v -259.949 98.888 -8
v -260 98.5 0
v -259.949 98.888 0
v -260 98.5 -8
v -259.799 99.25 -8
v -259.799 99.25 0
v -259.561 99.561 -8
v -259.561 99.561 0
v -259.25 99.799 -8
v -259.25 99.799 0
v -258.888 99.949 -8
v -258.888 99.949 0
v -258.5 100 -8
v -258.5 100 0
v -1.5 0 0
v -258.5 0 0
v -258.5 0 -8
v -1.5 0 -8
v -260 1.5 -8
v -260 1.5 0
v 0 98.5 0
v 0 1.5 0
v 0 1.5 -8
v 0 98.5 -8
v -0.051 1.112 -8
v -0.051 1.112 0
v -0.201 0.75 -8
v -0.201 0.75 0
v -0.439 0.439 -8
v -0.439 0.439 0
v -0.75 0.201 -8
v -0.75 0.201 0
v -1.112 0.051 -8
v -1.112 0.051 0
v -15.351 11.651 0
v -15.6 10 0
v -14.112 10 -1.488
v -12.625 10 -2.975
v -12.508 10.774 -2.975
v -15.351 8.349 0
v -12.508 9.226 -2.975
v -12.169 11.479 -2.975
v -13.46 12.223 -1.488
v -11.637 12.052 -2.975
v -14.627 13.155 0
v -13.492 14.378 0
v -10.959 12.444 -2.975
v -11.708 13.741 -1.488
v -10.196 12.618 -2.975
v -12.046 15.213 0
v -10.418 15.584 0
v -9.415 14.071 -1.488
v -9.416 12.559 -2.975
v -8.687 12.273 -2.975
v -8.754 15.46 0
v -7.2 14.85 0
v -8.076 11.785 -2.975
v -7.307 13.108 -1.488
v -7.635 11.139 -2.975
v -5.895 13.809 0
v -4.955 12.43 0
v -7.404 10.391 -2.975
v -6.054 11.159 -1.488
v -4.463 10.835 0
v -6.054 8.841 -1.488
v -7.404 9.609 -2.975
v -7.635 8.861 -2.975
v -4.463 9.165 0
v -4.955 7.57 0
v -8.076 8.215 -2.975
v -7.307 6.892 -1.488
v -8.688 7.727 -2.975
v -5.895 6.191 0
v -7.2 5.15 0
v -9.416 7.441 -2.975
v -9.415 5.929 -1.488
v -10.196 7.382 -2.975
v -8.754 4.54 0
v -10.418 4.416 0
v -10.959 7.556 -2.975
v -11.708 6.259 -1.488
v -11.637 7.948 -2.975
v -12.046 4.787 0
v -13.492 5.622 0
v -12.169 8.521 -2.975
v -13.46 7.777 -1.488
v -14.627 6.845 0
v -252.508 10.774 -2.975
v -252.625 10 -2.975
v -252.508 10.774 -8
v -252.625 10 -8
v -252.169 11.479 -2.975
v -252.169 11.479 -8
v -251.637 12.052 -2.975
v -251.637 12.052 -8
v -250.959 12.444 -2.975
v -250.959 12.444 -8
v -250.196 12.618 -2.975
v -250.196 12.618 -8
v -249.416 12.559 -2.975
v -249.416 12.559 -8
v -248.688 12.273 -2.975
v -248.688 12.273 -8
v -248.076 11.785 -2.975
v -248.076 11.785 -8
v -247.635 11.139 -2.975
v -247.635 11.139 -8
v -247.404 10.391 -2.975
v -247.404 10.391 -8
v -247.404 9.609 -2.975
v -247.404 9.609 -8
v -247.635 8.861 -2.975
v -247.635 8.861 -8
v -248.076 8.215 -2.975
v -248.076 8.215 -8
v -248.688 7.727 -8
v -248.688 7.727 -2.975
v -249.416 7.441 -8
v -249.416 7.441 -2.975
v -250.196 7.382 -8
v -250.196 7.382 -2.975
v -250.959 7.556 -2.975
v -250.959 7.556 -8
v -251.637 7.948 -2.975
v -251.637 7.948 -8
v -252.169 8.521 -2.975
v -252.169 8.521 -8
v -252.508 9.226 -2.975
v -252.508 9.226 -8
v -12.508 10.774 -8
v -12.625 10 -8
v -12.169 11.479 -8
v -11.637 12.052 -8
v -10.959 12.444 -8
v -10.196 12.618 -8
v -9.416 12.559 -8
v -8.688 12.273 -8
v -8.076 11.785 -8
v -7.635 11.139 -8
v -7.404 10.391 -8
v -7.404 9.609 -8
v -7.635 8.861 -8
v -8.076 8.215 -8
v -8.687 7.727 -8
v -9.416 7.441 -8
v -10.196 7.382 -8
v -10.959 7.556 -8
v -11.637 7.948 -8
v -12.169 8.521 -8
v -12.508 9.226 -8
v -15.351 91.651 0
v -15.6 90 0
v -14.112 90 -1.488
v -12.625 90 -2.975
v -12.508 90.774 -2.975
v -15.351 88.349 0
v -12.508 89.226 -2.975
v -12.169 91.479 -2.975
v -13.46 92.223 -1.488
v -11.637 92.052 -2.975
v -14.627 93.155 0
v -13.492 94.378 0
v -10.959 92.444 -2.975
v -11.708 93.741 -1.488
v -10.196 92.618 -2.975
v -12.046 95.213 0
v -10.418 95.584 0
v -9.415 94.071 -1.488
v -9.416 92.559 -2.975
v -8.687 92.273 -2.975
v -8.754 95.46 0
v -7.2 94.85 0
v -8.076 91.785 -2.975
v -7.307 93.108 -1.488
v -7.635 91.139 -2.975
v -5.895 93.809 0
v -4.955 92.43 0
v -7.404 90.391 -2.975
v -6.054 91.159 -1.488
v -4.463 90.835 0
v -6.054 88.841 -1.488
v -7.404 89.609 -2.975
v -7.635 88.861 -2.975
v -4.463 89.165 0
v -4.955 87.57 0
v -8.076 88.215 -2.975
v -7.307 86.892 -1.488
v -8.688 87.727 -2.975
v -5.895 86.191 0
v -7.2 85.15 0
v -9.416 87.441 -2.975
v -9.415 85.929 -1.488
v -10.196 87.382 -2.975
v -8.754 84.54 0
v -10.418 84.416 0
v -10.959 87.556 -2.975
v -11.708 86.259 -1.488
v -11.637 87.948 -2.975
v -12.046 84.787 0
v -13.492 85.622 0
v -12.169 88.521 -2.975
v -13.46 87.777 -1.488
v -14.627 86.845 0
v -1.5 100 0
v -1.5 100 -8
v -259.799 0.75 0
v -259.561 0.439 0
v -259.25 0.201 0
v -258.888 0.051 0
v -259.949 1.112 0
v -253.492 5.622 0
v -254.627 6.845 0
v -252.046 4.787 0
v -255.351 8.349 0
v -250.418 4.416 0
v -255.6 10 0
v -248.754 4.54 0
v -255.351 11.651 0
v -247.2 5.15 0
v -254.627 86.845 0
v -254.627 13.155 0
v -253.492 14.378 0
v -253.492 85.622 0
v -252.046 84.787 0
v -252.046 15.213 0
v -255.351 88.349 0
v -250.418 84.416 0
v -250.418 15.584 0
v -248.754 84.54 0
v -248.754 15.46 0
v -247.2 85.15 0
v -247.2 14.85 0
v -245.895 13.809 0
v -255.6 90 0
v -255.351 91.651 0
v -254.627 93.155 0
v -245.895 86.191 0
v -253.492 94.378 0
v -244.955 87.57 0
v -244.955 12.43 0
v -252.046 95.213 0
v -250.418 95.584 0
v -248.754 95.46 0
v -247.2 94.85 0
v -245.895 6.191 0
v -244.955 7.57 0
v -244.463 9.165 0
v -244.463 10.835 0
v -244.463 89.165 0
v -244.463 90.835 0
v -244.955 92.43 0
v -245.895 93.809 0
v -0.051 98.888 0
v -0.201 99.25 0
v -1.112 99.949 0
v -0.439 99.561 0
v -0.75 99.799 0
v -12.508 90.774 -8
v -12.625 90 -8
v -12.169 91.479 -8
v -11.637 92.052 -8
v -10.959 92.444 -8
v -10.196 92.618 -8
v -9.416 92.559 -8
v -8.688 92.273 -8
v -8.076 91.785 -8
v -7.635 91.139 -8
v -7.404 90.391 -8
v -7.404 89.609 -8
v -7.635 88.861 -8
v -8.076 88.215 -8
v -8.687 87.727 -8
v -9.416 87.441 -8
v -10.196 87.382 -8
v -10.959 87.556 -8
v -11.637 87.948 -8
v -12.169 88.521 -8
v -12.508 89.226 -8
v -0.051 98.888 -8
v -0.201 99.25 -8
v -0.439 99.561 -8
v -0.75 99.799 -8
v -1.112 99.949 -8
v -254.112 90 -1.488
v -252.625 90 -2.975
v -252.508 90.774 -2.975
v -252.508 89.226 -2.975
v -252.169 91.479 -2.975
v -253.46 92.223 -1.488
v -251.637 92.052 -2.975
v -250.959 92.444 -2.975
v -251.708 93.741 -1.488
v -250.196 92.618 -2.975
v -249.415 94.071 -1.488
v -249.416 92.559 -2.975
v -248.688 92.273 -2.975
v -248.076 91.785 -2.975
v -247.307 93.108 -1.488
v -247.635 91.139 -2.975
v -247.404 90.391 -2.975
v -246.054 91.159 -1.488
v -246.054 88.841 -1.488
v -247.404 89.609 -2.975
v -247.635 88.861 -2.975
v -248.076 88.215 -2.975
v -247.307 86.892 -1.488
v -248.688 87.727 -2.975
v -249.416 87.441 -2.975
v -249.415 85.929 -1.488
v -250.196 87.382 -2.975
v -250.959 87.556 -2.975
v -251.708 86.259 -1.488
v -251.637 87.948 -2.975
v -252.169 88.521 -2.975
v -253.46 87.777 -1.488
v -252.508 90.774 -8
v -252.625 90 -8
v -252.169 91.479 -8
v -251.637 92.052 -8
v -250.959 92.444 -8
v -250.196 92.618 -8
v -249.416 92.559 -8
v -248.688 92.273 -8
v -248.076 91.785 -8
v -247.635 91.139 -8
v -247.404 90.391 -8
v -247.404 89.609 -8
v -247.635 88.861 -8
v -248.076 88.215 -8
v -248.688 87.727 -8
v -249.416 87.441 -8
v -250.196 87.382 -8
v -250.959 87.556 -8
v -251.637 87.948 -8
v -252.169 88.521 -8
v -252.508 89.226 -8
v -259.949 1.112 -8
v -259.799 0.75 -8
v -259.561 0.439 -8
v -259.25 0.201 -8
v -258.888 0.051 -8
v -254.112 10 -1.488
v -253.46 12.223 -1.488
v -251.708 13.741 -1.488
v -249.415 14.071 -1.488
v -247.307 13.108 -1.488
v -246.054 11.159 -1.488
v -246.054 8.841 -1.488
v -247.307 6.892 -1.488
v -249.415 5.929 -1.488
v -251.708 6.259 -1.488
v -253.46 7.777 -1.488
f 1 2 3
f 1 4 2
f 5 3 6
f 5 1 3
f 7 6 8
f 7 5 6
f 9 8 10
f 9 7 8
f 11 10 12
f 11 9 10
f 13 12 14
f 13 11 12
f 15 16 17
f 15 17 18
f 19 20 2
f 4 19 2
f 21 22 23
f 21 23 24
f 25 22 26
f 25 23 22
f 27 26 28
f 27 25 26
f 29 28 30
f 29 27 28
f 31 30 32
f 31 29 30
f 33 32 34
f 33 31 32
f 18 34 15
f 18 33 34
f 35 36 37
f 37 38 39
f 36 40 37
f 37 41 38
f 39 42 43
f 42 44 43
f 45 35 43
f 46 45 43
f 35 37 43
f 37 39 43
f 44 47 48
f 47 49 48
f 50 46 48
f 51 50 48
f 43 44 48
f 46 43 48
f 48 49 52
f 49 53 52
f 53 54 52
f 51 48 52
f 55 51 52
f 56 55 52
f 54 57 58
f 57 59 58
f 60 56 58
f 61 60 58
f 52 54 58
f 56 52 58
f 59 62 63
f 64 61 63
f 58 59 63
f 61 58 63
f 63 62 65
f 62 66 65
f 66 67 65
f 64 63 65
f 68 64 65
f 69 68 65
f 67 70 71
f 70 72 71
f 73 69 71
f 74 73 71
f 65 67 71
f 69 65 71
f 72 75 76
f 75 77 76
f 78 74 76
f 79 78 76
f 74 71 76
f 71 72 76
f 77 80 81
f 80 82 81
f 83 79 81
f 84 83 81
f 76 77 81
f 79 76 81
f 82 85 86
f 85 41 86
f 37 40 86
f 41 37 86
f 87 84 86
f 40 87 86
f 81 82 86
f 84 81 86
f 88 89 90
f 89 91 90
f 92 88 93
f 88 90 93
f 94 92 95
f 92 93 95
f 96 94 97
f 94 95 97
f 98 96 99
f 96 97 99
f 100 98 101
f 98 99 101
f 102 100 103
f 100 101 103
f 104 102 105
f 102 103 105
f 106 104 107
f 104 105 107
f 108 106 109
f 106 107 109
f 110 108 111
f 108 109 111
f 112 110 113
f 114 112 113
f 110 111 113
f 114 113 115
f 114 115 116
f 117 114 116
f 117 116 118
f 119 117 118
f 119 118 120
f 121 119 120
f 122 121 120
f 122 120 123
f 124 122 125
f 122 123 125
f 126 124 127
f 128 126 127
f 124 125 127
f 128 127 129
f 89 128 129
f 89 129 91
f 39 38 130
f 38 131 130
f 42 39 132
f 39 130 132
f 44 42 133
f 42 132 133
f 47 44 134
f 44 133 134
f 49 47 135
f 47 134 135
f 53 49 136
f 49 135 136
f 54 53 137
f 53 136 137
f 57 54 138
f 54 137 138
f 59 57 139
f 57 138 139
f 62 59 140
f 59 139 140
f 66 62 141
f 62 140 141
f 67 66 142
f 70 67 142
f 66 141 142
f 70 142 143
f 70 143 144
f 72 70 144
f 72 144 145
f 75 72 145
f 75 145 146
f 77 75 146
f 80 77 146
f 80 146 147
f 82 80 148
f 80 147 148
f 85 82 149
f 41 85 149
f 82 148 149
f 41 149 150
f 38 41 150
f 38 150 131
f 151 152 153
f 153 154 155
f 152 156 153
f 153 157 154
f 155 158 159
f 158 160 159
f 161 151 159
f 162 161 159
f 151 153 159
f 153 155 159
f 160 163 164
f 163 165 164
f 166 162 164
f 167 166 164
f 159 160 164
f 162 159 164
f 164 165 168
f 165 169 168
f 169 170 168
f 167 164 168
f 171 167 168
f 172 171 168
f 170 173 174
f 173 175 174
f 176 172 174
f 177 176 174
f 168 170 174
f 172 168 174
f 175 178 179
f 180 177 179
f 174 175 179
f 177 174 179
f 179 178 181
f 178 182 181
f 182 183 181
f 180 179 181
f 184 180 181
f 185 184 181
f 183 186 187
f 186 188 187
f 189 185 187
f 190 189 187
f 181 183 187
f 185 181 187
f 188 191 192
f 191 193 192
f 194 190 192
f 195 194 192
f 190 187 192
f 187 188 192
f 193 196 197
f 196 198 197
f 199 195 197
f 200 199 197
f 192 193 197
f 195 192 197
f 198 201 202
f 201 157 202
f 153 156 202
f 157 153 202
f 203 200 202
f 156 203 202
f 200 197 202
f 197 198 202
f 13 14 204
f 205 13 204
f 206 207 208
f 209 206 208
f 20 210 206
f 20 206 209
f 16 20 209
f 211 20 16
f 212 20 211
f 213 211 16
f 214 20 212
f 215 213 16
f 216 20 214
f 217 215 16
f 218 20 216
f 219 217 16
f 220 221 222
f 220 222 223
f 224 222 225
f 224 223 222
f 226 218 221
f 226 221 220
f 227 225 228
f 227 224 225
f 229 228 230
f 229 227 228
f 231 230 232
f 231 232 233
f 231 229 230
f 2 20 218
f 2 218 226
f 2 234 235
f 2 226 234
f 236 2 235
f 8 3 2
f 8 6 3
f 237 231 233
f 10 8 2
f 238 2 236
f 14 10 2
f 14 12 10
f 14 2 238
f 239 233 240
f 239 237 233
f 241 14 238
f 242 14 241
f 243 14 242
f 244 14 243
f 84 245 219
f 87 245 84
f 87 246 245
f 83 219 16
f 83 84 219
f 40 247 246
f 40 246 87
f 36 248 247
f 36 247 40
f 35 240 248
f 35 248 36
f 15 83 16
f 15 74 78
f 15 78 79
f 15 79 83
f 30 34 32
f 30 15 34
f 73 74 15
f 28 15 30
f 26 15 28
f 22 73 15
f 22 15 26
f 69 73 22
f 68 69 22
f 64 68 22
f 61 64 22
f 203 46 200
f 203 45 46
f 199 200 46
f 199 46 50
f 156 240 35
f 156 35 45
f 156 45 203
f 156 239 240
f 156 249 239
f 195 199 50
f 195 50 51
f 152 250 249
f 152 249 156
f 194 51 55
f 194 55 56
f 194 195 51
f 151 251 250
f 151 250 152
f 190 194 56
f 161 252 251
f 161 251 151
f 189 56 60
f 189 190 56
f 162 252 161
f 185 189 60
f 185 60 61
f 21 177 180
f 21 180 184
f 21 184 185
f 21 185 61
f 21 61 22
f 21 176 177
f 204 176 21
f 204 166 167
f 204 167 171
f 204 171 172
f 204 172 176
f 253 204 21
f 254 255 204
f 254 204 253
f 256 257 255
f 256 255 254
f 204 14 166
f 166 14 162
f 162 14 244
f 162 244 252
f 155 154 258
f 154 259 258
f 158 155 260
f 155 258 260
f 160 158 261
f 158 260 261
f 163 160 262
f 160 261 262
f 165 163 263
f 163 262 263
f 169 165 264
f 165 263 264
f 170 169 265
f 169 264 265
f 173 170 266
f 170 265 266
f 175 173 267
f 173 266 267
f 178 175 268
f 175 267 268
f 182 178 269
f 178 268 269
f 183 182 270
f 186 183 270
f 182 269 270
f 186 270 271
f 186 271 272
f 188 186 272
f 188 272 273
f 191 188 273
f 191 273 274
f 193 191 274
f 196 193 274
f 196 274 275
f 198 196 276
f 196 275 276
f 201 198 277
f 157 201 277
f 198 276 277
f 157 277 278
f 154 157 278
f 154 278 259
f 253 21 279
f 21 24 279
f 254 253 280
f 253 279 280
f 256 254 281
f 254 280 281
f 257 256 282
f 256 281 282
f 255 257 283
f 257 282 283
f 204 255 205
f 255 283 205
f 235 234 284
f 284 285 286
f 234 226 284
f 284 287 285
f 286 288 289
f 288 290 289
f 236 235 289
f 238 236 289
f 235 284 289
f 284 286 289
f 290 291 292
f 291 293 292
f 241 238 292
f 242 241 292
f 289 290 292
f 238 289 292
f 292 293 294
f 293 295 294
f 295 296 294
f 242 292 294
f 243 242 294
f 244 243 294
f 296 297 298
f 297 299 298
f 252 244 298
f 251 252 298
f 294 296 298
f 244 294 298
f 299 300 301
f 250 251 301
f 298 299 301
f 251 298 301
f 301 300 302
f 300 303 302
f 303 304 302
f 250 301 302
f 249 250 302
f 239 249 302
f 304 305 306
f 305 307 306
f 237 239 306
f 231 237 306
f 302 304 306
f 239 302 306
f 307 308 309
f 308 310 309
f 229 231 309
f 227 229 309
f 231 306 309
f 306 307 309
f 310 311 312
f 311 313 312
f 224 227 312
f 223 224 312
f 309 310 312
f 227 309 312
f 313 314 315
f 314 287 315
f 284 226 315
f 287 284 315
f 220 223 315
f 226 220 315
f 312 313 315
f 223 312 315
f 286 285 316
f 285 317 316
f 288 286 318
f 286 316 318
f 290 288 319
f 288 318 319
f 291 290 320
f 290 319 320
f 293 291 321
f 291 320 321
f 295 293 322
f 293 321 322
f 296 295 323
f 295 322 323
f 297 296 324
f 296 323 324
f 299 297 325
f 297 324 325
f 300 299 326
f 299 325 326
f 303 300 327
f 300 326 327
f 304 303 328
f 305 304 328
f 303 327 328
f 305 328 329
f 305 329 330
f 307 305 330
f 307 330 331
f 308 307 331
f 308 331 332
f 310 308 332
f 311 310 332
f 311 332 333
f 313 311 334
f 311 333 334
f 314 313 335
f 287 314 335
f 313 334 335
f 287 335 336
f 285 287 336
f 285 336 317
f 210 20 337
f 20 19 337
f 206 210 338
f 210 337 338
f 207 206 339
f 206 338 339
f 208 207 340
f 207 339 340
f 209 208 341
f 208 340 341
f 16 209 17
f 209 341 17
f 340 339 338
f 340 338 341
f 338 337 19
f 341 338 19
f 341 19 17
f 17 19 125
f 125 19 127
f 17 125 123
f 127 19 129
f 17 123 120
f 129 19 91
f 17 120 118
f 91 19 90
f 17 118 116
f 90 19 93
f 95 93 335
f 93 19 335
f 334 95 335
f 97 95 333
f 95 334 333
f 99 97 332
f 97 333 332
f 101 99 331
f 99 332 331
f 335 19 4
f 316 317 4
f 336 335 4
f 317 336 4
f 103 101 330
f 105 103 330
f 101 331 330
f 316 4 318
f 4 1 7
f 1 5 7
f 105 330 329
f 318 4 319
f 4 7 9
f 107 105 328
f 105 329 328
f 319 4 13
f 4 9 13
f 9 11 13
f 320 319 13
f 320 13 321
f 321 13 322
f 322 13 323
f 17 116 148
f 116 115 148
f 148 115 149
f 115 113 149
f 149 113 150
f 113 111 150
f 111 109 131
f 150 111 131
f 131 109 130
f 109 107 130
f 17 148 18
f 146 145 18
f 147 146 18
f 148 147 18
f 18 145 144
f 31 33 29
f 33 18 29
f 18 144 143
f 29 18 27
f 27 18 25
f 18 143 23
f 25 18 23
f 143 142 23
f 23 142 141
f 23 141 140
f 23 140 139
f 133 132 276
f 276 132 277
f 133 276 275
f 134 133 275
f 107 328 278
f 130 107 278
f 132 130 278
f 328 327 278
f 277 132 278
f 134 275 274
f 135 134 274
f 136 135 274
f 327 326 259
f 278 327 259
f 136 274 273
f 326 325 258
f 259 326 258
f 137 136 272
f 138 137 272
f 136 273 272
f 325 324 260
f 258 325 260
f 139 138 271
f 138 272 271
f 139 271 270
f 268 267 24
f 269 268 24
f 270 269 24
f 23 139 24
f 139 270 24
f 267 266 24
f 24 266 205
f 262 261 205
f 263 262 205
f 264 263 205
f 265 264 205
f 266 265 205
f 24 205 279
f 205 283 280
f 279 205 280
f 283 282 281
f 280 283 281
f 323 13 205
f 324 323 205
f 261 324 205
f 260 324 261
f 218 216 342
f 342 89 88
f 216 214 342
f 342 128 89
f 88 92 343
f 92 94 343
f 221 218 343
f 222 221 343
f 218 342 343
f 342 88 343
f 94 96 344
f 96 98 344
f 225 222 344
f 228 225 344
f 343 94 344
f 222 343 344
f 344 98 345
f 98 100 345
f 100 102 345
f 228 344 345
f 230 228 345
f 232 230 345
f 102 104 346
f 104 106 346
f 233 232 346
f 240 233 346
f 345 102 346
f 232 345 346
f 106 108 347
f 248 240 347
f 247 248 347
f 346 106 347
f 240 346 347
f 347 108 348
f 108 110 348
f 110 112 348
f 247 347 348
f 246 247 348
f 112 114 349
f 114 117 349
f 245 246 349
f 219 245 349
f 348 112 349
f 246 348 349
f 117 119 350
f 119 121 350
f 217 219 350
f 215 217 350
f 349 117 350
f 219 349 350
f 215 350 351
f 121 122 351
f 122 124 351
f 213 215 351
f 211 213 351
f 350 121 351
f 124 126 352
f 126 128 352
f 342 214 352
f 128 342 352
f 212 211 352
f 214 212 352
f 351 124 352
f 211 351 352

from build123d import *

# Parameters (mm, degrees)
F0_W           = 260
F0_H           = 100
F1_DEPTH       = 8
F2_D           = 5.25
F2_CSINK_D     = 11.2
F2_CSINK_ANGLE = 90
F3_R           = 1.5


# Not quite as in the source:
# - a feature names something its author has since deleted; it is built from what else it names


with BuildPart() as f1:
    # F0 (on Top) → F1 (new body)
    with BuildSketch(Plane.XY):
        with Locations((-130, 50)):
            Rectangle(F0_W, F0_H)
    extrude(amount=-F1_DEPTH)

    # F2 (through all)
    with Locations(Plane.XY):
        with Locations((-250, 10), (-10, 10), (-10, 90), (-250, 90)):
            CounterSinkHole(F2_D / 2, F2_CSINK_D / 2, counter_sink_angle=F2_CSINK_ANGLE)

    # F3
    f3_edges = [f1.edges().sort_by_distance(p)[0] for p in [
        (0, 0, -4),
        (0, 100, -4),
        (-260, 0, -4),
        (-260, 100, -4),
    ]]
    fillet(f3_edges, radius=F3_R)


solid = f1.part
